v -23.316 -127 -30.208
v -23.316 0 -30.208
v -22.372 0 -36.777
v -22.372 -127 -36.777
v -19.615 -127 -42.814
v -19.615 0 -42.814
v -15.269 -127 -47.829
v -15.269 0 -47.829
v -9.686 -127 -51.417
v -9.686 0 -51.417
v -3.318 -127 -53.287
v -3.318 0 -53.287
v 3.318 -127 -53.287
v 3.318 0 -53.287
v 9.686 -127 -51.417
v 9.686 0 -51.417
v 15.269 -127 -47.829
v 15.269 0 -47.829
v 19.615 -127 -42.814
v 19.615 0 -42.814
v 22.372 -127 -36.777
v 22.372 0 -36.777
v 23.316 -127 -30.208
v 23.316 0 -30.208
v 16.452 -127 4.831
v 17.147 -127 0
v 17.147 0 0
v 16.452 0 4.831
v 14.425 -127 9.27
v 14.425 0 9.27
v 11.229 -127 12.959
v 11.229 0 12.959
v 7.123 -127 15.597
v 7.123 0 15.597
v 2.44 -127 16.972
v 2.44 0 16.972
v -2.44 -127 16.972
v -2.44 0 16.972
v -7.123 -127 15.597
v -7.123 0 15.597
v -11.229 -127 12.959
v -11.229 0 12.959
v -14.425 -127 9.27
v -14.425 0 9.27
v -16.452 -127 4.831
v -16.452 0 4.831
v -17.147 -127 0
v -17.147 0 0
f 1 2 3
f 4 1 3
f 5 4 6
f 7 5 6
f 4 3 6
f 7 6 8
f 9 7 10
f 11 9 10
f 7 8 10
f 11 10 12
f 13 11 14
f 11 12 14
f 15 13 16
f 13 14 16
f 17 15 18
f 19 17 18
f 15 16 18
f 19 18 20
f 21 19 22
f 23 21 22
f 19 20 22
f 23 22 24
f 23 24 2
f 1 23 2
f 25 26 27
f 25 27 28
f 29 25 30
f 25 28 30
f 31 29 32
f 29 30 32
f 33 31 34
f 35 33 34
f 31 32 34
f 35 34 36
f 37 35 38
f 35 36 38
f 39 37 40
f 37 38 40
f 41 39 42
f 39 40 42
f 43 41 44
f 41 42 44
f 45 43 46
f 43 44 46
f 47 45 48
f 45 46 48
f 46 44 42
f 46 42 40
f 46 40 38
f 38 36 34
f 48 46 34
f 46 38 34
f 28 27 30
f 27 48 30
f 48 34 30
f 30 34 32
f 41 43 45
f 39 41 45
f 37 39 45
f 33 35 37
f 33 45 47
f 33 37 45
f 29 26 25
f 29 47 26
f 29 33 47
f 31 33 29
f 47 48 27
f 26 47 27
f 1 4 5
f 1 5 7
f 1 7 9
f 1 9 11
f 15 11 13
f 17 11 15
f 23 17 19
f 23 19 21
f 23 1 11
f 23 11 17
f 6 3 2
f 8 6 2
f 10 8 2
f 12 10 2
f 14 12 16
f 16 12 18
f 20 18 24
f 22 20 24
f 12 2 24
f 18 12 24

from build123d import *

# Parameters (mm, degrees)
F1_DEPTH = 127


with BuildPart() as f1:
    # F0 (on Front) → F1 (new body)
    with BuildSketch(Plane.XZ):
        with BuildLine():
            Line((23.3164, -30.208113), (-23.3164, -30.208113))
            ThreePointArc((-23.3164, -30.208113), (0, -53.524513), (23.3164, -30.208113))
        make_face()
        with BuildLine():
            ThreePointArc((17.146846, 0), (0, 17.146846), (-17.146846, 0))
            Line((-17.146846, 0), (17.146846, 0))
        make_face()
    extrude(amount=F1_DEPTH)


solid = f1.part
